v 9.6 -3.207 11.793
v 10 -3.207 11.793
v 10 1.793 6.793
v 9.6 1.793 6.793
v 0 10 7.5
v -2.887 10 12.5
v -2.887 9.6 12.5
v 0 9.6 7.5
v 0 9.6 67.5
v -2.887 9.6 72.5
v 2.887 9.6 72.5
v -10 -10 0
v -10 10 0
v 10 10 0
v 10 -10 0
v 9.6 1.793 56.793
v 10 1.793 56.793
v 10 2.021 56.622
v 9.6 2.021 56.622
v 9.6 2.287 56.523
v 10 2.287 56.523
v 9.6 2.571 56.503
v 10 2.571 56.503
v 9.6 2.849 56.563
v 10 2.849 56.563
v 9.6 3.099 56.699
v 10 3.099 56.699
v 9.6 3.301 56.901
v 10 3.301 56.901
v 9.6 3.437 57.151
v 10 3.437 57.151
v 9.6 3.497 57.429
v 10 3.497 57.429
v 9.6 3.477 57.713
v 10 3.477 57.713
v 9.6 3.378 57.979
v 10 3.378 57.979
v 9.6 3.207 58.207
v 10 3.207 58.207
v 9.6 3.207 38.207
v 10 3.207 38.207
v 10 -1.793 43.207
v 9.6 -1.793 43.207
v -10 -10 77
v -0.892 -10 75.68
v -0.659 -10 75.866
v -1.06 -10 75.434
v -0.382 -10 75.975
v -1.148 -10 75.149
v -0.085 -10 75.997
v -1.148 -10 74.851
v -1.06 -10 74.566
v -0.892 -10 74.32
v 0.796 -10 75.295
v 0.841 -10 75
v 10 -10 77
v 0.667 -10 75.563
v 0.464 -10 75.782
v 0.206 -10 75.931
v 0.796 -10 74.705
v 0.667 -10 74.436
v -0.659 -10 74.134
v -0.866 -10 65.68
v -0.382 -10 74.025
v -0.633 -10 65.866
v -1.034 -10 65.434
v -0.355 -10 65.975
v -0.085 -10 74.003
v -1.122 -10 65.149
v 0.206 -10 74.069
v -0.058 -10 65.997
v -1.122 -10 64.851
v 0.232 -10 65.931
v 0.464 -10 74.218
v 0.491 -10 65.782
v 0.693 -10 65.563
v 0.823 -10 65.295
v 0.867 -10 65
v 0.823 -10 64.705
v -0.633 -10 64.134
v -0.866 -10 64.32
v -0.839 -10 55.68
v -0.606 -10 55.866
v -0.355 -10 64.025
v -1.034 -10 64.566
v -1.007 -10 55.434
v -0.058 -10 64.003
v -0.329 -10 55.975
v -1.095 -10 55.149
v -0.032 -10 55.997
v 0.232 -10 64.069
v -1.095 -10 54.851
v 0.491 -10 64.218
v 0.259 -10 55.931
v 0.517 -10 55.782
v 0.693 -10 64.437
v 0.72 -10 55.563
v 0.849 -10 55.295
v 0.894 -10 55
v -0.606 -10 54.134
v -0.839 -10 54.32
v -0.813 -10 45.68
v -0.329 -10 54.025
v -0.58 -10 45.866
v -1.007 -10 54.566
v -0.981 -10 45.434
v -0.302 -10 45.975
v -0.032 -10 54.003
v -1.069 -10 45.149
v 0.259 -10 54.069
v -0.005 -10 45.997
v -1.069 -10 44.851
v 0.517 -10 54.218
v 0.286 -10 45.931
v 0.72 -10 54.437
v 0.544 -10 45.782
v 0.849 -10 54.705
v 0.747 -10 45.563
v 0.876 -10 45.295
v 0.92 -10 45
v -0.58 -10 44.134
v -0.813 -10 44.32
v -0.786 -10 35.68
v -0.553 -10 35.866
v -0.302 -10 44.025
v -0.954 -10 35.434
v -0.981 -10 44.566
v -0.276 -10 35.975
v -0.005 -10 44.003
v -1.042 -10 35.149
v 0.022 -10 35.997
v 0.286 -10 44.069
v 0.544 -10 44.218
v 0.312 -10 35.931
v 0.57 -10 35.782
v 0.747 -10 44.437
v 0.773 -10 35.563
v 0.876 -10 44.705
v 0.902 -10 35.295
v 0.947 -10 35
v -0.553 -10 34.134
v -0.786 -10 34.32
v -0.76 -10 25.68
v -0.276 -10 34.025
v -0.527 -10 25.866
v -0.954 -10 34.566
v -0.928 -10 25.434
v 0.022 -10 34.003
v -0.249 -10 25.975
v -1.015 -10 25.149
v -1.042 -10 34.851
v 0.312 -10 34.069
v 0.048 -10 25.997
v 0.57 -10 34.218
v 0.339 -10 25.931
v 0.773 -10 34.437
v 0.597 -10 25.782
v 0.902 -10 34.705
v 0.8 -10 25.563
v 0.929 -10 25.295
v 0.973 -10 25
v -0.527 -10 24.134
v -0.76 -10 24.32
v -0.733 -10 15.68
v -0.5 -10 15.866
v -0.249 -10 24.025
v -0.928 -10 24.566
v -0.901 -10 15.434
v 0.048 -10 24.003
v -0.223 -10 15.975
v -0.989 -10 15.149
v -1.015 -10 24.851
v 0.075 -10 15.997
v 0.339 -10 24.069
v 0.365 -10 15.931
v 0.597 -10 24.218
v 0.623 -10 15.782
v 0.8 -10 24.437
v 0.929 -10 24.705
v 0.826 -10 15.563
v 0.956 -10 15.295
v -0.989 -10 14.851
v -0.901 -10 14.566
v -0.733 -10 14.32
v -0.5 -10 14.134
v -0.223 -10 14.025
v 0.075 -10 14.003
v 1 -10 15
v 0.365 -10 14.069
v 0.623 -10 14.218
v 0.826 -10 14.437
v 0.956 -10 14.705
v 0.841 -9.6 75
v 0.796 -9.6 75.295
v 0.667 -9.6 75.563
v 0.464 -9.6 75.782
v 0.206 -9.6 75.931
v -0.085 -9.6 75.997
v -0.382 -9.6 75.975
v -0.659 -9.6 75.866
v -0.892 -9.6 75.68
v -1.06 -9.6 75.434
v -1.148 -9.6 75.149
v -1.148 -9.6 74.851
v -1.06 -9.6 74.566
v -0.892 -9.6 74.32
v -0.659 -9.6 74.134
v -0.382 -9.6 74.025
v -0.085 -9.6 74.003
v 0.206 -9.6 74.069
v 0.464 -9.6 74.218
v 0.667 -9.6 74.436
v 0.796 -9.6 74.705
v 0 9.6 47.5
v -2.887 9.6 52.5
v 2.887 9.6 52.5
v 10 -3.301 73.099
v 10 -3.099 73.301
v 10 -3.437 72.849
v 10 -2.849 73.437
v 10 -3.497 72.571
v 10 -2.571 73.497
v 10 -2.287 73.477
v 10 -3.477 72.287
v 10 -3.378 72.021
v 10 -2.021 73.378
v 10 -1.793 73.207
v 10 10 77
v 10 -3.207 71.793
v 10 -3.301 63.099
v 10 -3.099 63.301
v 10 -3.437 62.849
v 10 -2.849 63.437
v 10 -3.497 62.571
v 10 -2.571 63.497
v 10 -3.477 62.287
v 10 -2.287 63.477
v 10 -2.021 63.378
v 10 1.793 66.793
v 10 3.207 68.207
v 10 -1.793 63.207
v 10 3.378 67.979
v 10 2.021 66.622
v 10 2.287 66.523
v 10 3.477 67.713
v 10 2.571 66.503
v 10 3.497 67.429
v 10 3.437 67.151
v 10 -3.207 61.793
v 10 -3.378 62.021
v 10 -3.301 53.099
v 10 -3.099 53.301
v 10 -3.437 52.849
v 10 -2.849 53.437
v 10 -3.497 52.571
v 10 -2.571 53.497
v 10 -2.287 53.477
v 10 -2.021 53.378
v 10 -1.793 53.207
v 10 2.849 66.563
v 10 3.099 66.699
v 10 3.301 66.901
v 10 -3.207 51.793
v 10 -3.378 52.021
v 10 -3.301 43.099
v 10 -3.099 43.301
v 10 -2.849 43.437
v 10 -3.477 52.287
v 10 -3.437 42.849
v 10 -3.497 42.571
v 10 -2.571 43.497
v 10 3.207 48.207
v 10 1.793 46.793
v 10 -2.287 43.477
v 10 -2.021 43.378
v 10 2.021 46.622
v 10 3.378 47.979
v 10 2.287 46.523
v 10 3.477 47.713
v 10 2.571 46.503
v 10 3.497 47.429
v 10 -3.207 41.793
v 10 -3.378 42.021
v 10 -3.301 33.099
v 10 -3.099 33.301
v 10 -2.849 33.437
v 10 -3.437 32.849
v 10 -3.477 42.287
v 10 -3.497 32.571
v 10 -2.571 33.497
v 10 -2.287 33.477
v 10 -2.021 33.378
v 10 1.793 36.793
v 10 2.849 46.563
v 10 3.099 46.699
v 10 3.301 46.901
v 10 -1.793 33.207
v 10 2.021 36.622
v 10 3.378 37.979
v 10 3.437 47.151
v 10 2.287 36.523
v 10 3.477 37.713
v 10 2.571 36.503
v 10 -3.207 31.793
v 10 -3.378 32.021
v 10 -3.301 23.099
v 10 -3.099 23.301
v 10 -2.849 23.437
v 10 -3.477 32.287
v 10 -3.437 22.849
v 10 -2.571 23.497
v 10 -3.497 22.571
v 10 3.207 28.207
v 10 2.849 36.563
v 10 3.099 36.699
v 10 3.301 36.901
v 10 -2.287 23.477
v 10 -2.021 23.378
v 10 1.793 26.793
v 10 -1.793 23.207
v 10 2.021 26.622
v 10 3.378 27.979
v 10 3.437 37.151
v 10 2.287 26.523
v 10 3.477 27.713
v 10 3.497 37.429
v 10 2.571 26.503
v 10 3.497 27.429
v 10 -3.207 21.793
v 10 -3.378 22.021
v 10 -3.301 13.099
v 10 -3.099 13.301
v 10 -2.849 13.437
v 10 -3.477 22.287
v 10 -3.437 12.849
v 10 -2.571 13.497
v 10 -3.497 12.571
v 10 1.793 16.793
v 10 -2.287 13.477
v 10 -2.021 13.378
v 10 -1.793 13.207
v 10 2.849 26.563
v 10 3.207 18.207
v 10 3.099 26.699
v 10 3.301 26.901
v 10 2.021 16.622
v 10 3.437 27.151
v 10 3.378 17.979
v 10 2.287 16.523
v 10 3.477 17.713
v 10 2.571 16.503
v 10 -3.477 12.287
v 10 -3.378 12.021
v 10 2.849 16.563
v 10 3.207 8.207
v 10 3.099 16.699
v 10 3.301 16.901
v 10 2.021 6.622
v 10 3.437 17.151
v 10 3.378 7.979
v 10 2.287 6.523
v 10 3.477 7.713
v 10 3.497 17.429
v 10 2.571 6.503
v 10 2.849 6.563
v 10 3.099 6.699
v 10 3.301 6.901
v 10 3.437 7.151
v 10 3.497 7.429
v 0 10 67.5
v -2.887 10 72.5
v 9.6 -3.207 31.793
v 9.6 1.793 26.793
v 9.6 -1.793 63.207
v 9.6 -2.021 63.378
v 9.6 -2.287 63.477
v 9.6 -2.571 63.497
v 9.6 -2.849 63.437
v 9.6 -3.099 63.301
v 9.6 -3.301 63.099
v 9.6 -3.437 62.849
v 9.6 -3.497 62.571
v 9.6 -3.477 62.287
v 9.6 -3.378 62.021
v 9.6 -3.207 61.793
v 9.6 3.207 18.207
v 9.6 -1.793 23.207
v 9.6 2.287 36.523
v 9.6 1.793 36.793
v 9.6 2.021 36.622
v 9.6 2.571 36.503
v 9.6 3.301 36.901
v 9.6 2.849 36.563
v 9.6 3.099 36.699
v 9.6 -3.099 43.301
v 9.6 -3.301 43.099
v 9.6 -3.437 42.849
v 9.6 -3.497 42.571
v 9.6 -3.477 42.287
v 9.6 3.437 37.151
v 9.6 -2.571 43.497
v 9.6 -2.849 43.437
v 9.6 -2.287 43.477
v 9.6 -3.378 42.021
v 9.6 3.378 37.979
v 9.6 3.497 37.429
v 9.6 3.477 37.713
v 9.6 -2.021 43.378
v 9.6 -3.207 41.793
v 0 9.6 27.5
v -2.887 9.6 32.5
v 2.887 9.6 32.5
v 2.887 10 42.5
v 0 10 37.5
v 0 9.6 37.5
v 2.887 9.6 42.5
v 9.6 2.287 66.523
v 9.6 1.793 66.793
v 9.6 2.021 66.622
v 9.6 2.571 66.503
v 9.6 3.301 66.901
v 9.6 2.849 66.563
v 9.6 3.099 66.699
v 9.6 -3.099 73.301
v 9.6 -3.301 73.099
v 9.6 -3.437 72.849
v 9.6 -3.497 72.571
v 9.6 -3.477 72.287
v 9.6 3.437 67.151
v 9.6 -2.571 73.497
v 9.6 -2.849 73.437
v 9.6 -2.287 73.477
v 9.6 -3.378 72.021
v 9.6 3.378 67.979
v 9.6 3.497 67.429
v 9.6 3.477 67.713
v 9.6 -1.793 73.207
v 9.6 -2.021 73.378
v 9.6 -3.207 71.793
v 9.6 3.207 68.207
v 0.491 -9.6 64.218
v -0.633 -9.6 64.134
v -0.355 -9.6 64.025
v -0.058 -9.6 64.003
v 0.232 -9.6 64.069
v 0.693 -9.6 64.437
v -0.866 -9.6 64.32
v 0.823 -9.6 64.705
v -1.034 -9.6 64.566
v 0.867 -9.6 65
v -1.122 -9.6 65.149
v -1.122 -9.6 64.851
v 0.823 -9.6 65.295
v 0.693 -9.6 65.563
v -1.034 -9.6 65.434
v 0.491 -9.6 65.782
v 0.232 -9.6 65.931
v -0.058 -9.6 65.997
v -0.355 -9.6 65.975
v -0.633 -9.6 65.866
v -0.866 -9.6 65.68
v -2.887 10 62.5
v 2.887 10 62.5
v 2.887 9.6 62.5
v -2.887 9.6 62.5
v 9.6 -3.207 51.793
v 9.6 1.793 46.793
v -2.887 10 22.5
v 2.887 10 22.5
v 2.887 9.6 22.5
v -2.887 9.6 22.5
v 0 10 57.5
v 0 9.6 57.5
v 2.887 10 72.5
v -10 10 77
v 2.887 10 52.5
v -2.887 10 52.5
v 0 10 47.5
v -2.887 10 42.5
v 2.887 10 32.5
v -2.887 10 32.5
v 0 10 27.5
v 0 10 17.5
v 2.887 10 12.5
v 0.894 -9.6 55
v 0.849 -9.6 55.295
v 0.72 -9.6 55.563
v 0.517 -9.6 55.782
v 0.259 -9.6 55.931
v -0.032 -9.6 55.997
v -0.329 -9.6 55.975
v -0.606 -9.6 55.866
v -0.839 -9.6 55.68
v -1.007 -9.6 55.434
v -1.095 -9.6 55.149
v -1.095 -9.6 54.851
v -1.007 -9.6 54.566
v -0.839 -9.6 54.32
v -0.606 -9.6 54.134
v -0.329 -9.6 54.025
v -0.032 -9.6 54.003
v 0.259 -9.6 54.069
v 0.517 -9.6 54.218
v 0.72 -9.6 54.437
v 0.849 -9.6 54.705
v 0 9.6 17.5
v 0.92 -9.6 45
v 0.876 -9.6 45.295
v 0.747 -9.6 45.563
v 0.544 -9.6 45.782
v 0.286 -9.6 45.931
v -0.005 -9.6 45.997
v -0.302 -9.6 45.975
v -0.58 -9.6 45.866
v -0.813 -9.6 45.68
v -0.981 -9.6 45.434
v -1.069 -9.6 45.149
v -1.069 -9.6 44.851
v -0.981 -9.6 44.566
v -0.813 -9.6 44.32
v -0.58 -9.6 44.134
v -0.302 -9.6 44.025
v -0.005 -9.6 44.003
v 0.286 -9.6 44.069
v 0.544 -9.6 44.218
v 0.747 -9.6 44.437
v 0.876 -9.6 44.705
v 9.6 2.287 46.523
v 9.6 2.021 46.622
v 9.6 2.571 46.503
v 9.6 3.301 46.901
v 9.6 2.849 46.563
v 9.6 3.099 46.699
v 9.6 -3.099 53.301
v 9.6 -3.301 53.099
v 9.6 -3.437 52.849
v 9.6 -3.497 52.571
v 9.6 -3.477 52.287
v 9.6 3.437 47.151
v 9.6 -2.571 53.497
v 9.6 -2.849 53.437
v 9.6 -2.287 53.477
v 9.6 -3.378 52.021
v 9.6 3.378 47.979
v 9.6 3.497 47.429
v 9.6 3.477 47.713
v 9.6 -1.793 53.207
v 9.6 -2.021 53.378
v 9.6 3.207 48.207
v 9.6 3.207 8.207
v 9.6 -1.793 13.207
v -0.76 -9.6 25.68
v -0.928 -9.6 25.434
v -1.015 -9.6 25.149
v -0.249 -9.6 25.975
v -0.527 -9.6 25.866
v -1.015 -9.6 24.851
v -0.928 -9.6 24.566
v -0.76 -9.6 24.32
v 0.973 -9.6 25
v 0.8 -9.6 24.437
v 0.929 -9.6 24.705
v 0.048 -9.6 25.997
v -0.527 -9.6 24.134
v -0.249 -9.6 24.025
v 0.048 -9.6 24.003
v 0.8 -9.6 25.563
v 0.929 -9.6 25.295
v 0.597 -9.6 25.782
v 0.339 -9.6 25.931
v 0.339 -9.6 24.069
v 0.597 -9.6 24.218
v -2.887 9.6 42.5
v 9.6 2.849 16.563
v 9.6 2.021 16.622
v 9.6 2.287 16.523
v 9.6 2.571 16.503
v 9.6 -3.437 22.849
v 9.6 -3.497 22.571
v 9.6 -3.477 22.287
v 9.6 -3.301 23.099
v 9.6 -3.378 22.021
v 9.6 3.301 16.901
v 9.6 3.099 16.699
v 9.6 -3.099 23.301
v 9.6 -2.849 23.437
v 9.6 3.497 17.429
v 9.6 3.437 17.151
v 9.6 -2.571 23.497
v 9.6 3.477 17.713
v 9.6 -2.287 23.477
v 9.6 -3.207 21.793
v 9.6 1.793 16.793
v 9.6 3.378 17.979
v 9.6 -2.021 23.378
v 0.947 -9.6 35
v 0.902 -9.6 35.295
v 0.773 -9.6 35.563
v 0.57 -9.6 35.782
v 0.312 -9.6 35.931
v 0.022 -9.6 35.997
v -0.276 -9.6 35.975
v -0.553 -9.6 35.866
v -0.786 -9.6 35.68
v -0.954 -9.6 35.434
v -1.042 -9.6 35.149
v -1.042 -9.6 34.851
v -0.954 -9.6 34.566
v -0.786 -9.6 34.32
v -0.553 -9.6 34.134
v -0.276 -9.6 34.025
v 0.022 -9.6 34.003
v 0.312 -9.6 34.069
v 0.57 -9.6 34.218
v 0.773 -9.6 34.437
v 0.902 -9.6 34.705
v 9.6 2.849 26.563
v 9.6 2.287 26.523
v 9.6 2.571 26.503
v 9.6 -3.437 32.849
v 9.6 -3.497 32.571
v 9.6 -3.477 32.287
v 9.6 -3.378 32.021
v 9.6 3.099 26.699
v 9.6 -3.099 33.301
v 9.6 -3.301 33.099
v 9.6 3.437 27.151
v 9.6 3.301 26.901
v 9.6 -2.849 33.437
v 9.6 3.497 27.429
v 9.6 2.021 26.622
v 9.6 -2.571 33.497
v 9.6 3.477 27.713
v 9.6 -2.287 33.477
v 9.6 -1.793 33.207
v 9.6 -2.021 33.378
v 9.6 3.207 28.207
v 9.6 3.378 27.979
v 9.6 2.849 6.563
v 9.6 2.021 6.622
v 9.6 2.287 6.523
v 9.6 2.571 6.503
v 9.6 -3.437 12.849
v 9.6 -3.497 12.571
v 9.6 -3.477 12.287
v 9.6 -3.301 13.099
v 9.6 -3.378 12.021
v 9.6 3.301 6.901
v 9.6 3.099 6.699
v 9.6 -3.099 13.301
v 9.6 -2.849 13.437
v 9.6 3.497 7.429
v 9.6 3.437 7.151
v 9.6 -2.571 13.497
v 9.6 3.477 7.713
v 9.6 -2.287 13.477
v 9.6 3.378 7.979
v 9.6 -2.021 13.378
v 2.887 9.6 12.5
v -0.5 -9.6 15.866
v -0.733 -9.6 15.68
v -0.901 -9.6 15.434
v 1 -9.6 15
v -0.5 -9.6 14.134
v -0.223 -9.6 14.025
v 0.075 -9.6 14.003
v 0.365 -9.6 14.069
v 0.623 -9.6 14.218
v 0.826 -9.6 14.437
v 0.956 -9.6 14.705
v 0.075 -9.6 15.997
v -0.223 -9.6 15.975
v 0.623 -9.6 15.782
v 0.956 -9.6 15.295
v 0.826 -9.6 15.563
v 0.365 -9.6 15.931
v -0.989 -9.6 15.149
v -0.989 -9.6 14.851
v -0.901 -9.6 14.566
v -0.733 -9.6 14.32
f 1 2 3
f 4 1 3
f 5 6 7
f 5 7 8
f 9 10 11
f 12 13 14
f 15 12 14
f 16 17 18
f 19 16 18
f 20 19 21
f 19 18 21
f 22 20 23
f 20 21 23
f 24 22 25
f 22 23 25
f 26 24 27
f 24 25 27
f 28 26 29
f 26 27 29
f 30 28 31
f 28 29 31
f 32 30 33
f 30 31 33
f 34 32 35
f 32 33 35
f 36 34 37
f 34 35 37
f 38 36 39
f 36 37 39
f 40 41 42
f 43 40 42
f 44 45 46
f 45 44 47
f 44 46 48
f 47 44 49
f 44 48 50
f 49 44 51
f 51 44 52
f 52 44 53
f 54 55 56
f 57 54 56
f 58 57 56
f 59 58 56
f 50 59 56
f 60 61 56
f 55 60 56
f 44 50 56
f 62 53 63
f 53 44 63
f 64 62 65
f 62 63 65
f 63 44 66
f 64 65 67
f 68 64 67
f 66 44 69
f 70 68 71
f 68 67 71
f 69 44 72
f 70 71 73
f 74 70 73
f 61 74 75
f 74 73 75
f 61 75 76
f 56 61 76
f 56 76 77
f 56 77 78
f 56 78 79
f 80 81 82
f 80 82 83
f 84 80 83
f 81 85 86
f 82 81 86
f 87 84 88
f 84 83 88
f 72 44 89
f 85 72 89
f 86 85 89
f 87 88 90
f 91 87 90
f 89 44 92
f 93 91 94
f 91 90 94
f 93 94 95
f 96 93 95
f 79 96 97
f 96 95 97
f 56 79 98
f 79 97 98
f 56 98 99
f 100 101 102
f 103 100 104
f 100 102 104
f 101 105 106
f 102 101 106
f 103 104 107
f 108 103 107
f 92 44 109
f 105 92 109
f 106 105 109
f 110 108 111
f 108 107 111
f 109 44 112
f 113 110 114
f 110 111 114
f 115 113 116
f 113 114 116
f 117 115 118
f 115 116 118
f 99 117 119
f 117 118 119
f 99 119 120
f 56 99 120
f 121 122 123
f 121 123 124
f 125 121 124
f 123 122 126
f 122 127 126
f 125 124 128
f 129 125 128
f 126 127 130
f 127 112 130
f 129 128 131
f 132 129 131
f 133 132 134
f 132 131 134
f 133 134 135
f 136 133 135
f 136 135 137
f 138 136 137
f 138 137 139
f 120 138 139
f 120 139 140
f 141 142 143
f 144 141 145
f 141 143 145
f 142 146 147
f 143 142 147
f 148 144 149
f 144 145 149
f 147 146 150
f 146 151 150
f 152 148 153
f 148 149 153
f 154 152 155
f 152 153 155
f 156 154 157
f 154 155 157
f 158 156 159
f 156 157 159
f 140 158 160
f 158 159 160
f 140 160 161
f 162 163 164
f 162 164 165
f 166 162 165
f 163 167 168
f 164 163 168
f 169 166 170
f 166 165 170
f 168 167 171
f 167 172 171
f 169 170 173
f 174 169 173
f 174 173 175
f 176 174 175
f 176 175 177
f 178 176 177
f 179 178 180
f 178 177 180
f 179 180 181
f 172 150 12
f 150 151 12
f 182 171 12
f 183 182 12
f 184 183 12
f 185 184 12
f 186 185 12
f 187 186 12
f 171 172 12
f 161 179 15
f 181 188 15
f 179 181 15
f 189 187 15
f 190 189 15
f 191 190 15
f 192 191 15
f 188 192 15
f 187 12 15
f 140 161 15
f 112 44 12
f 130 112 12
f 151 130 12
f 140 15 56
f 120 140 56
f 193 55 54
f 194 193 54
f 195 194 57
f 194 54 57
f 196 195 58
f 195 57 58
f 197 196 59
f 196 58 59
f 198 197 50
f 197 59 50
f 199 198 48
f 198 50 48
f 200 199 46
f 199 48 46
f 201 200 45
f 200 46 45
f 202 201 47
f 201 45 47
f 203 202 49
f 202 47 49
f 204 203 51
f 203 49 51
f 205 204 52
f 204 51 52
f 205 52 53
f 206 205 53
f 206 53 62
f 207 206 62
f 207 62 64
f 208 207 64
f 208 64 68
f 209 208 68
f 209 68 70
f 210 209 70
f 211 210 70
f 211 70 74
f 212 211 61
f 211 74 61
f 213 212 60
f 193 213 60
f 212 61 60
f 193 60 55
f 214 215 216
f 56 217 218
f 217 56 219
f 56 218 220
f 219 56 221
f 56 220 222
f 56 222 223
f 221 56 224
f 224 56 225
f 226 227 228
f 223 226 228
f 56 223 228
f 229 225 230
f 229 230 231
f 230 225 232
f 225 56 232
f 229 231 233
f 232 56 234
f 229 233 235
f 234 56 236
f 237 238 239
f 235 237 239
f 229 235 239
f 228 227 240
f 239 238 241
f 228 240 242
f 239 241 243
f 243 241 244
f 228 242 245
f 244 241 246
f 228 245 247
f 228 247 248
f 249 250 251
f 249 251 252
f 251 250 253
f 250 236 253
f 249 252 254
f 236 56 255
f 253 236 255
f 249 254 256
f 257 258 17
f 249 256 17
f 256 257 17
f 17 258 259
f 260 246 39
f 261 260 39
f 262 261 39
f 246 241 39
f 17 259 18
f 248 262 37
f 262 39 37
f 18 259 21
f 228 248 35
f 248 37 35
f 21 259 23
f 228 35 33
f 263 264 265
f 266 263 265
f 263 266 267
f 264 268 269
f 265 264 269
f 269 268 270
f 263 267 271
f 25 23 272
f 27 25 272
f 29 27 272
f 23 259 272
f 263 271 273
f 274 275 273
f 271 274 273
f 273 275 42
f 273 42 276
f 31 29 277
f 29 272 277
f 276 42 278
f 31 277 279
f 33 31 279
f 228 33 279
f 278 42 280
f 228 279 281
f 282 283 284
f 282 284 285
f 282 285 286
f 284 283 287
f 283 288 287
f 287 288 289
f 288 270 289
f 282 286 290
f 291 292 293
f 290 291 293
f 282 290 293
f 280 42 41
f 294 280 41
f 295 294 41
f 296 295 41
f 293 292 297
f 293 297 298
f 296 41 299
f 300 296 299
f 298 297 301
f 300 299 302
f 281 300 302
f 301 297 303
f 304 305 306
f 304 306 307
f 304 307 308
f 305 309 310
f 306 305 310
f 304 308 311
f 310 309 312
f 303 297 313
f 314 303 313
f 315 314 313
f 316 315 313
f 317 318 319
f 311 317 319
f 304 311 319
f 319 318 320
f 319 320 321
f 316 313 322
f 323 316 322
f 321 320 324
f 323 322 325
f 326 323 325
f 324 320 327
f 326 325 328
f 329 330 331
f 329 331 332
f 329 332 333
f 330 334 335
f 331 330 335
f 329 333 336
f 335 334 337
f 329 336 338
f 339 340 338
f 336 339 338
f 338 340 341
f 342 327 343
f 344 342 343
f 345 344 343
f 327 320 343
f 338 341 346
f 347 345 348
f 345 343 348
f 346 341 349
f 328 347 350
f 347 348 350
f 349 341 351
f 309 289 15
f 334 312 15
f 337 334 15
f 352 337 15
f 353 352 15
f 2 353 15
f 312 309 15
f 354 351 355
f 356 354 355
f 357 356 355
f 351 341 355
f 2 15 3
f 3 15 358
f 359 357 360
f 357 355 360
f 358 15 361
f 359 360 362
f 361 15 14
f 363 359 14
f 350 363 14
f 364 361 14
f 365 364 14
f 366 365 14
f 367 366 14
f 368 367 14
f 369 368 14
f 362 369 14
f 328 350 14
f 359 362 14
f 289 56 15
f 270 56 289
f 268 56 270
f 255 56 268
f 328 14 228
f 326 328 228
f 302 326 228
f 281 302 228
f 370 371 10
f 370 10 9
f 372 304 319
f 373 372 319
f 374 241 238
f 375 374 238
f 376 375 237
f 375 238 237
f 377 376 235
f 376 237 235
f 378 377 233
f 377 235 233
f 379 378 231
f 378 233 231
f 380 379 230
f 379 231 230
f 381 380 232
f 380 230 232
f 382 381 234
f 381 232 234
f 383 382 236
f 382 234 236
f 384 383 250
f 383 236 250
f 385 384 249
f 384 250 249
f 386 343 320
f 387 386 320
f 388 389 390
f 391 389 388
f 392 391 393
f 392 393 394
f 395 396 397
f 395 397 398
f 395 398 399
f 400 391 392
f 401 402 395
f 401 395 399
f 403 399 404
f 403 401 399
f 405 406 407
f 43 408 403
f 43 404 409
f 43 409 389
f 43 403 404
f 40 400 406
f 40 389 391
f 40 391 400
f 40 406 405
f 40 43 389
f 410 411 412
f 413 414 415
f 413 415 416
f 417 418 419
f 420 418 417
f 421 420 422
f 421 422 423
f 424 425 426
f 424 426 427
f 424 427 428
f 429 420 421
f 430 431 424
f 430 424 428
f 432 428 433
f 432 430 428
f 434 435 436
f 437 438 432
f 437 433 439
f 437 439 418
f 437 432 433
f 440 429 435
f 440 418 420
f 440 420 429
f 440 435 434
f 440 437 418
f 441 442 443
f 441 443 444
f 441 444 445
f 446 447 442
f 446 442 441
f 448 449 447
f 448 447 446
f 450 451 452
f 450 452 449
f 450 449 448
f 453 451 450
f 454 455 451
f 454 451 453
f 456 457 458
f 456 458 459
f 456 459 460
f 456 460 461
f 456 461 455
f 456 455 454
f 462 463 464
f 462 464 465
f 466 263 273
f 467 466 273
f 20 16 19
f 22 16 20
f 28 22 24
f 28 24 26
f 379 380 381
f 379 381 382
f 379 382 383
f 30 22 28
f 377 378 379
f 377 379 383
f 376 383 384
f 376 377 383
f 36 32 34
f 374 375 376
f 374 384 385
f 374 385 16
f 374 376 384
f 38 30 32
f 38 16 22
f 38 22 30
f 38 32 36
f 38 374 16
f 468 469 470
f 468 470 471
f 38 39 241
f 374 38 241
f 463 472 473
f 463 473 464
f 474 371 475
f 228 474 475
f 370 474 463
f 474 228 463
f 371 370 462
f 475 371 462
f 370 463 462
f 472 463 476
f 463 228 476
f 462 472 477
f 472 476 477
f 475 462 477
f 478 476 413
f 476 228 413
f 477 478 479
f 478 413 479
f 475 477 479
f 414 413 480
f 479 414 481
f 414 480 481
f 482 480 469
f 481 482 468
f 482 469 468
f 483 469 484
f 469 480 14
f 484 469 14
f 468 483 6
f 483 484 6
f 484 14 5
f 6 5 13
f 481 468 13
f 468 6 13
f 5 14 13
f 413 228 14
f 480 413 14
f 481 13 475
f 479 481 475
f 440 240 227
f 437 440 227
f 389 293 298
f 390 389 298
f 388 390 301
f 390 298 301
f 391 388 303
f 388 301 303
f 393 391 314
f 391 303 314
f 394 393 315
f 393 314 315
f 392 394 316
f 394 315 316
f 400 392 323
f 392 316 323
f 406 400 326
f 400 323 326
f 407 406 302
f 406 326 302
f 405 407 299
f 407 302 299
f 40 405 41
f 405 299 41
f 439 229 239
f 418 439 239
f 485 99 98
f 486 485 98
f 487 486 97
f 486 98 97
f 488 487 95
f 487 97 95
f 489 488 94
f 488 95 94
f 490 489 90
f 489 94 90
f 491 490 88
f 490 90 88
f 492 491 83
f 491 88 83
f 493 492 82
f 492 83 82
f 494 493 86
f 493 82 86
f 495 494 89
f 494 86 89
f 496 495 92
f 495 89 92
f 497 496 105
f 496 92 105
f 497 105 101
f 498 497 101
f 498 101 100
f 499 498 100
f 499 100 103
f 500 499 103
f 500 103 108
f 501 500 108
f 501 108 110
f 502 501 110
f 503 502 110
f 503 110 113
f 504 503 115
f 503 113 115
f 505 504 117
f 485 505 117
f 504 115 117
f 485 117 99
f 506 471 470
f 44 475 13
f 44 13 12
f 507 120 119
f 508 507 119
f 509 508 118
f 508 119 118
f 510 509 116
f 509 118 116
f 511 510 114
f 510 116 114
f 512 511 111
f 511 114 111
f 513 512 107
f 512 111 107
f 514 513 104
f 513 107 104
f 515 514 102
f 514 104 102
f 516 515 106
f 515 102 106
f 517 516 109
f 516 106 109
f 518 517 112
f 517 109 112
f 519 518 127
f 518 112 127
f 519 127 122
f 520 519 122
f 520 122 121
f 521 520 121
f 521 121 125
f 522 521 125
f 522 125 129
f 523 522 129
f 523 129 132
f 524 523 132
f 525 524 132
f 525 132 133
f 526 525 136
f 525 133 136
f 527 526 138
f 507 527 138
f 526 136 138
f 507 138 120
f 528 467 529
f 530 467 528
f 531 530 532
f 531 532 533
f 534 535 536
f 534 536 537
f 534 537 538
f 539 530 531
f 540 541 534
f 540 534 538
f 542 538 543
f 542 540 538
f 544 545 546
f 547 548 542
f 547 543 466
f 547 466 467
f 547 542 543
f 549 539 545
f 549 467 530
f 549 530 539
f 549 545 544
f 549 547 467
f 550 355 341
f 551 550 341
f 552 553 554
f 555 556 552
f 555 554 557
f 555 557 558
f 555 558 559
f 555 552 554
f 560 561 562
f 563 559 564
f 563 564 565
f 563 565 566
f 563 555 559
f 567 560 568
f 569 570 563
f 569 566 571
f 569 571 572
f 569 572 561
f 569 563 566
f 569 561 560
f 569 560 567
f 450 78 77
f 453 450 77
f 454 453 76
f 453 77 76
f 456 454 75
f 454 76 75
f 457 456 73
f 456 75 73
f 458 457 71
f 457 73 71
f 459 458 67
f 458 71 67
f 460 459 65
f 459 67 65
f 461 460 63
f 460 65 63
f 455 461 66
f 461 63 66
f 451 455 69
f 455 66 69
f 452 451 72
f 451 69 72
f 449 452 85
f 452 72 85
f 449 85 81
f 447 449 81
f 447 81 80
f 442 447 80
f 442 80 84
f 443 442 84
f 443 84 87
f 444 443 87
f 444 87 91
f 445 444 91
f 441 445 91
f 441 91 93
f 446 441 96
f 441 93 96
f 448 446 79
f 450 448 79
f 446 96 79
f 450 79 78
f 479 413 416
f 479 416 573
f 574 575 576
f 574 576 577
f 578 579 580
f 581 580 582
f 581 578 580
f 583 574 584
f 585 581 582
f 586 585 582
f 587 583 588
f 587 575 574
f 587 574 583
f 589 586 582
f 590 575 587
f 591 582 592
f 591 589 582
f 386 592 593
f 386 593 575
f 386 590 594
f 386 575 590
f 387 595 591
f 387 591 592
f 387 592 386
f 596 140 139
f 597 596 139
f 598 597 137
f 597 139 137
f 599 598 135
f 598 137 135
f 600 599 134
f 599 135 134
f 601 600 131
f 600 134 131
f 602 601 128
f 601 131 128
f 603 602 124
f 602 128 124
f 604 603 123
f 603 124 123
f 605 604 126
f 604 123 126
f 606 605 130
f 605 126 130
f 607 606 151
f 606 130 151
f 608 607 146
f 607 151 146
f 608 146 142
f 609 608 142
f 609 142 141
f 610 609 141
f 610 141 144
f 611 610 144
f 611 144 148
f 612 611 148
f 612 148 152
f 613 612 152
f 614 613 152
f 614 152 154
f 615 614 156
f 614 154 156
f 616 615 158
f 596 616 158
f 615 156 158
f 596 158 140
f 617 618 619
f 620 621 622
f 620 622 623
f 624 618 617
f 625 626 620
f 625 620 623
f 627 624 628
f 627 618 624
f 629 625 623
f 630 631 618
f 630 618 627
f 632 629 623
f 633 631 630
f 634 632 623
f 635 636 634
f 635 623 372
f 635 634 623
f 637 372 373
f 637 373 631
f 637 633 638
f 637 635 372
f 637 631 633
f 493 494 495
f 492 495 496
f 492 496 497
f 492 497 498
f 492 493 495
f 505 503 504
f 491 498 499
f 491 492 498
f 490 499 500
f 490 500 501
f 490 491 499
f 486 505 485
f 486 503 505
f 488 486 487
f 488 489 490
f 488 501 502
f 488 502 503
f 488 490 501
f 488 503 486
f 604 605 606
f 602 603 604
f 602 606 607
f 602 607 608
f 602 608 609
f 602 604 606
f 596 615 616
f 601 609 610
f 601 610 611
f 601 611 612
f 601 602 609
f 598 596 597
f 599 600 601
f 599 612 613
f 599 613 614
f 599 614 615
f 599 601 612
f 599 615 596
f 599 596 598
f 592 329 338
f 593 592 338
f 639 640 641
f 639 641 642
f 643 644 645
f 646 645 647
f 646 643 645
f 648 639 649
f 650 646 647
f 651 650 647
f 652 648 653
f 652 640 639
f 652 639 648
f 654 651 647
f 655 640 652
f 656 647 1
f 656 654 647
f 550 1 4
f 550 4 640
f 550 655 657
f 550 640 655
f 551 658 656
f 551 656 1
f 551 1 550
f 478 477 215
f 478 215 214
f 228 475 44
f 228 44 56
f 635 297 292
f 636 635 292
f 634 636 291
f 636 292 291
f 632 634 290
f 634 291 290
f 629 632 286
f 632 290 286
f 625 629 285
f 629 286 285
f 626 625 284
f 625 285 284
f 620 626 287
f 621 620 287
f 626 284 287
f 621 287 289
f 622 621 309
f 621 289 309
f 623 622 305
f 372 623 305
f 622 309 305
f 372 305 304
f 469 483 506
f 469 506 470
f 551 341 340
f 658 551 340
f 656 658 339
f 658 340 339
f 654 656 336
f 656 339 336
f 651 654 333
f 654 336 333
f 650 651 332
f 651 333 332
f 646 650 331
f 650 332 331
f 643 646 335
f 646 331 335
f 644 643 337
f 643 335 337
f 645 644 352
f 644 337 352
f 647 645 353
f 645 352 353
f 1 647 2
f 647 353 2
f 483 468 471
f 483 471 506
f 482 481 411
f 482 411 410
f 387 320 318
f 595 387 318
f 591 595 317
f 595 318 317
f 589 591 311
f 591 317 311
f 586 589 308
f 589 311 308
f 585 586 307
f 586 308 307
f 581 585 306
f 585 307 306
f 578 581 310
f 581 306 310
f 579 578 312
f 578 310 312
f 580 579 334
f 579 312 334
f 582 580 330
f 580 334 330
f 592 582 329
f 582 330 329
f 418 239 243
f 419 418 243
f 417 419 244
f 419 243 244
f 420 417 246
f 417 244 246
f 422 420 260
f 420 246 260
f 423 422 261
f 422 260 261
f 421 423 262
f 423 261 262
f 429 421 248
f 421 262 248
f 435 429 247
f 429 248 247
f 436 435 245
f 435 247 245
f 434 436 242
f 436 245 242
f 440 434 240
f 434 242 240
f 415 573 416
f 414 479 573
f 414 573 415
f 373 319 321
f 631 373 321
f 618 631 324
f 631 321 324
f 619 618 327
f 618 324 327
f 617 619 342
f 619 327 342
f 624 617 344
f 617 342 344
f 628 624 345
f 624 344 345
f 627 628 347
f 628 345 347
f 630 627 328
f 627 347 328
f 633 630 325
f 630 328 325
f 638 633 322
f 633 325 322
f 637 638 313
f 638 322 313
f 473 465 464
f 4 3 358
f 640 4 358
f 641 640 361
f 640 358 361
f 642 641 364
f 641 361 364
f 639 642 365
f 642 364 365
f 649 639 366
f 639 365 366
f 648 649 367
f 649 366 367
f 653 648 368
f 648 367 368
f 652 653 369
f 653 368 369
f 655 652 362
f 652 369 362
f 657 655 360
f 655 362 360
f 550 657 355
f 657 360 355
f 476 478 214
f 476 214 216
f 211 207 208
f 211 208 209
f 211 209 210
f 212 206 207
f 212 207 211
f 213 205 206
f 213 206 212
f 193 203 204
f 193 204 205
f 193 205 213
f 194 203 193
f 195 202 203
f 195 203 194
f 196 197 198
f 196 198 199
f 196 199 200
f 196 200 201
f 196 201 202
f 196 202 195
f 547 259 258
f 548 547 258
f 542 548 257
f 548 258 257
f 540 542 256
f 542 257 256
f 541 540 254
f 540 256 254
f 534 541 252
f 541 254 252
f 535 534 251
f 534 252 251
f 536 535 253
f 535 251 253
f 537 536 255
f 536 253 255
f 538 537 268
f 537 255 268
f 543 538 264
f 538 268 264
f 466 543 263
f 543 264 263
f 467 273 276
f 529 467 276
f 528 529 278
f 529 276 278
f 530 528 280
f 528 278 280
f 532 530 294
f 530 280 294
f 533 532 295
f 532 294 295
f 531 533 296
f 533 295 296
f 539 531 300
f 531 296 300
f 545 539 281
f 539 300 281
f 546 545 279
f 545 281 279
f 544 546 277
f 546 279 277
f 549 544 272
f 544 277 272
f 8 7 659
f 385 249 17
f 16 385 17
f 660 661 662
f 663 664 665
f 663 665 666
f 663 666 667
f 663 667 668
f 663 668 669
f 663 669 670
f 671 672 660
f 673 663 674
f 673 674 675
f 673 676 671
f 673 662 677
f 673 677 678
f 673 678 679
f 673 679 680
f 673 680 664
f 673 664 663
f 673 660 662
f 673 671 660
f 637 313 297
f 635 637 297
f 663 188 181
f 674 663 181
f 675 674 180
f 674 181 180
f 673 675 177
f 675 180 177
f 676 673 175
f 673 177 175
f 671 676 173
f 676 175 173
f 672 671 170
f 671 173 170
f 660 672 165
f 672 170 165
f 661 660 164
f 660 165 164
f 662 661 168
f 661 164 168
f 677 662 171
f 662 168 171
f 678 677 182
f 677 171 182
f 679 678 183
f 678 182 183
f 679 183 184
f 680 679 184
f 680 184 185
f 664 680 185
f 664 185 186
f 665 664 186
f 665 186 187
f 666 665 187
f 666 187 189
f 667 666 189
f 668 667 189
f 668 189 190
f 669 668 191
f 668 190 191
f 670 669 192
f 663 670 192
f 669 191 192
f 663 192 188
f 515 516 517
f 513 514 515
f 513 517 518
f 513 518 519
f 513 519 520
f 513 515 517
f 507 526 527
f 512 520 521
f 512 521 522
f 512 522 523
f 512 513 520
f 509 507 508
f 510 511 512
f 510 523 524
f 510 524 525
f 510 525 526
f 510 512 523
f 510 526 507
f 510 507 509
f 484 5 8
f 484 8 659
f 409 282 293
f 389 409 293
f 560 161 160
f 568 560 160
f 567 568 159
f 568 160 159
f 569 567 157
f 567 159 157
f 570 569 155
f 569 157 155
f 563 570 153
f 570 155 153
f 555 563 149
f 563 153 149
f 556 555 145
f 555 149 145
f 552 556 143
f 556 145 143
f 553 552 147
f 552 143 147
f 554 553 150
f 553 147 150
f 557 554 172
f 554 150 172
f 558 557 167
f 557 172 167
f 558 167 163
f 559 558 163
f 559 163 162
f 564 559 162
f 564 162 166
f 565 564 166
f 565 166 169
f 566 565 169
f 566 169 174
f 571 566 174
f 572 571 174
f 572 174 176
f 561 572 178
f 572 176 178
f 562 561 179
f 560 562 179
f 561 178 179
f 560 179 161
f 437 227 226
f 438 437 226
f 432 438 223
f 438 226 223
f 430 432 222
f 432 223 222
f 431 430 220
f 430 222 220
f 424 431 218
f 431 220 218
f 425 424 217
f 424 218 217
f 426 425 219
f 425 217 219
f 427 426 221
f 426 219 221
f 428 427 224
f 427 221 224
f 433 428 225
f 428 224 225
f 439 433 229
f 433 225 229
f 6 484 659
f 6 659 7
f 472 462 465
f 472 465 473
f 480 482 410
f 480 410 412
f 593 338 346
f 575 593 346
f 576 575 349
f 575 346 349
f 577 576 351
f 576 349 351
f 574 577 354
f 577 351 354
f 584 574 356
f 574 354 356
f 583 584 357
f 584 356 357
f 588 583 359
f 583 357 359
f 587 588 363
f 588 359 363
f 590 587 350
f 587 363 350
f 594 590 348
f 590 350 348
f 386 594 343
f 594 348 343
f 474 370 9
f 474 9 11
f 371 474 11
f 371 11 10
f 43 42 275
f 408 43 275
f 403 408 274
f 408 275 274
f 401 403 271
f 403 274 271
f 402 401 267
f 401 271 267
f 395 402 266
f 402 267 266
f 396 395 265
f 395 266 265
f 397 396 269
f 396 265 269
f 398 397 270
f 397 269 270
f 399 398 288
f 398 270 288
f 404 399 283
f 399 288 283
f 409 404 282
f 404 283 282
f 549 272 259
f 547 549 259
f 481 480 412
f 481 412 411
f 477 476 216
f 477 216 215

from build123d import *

# Parameters (mm, degrees)
F1_DEPTH  = 77
F3_R      = 1
F4_DEPTH  = 0.4
F1_FACE_W = 20
F1_FACE_H = 77
F7_DEPTH  = 0.4
F10_DEPTH = 0.4


with BuildPart() as f1:
    # F0 (on Top) → F1 (new body)
    with BuildSketch(Plane.XY):
        with BuildLine():
            ThreePointArc((-10, 0), (-7.0710678119, 7.0710678119), (0, 10))
            Line((0, 10), (-10, 10))
            Line((-10, 10), (-10, 0))
        make_face()
        with BuildLine():
            Line((-10, -10), (0, -10))
            ThreePointArc((0, -10), (-7.0710678119, -7.0710678119), (-10, 0))
            Line((-10, 0), (-10, -10))
        make_face()
        with BuildLine():
            Line((10, -10), (10, 0))
            ThreePointArc((10, 0), (7.0710678119, -7.0710678119), (0, -10))
            Line((0, -10), (10, -10))
        make_face()
        with BuildLine():
            ThreePointArc((0, 10), (7.0710678119, 7.0710678119), (10, 0))
            Line((10, 0), (10, 10))
            Line((10, 10), (0, 10))
        make_face()
        with BuildLine():
            ThreePointArc((0, -10), (7.0710678119, -7.0710678119), (10, 0))
            ThreePointArc((10, 0), (7.0710678119, 7.0710678119), (0, 10))
            ThreePointArc((0, 10), (-7.0710678119, 7.0710678119), (-10, 0))
            ThreePointArc((-10, 0), (-7.0710678119, -7.0710678119), (0, -10))
        make_face()
    extrude(amount=F1_DEPTH)

    # F3 (on offset) → F4 (cut)
    with BuildSketch(Plane.XZ.offset(10)):
        with Locations((0, 15)):
            Circle(F3_R)
        with Locations((-0.0265743064, 24.9999646902)):
            Circle(F3_R)
        with Locations((-0.0531486127, 34.9999293805)):
            Circle(F3_R)
        with Locations((-0.0797229191, 44.9998940707)):
            Circle(F3_R)
        with Locations((-0.1062972255, 54.999858761)):
            Circle(F3_R)
        with Locations((-0.1328715318, 64.9998234512)):
            Circle(F3_R)
        with Locations((-0.1594458382, 74.9997881415)):
            Circle(F3_R)
    extrude(amount=-F4_DEPTH, mode=Mode.SUBTRACT)

    # F6 (on offset) + F1_face (on face) → F7 (cut)
    with BuildSketch(Plane.YZ.offset(10)):
        with BuildLine():
            ThreePointArc((-1.7928932188, 13.2071067812), (-3.2071067812, 13.2071067812), (-3.2071067812, 11.7928932188))
            Line((-3.2071067812, 11.7928932188), (1.7928932188, 6.7928932188))
            ThreePointArc((1.7928932188, 6.7928932188), (3.2071067812, 6.7928932188), (3.2071067812, 8.2071067812))
            Line((3.2071067812, 8.2071067812), (-1.7928932188, 13.2071067812))
        make_face()
        with BuildLine():
            ThreePointArc((-1.7928932188, 23.2071067812), (-3.2071067812, 23.2071067812), (-3.2071067812, 21.7928932188))
            Line((-3.2071067812, 21.7928932188), (1.7928932188, 16.7928932188))
            ThreePointArc((1.7928932188, 16.7928932188), (3.2071067812, 16.7928932188), (3.2071067812, 18.2071067812))
            Line((3.2071067812, 18.2071067812), (-1.7928932188, 23.2071067812))
        make_face()
        with BuildLine():
            ThreePointArc((-1.7928932188, 33.2071067812), (-3.2071067812, 33.2071067812), (-3.2071067812, 31.7928932188))
            Line((-3.2071067812, 31.7928932188), (1.7928932188, 26.7928932188))
            ThreePointArc((1.7928932188, 26.7928932188), (3.2071067812, 26.7928932188), (3.2071067812, 28.2071067812))
            Line((3.2071067812, 28.2071067812), (-1.7928932188, 33.2071067812))
        make_face()
        with BuildLine():
            ThreePointArc((-1.7928932188, 43.2071067812), (-3.2071067812, 43.2071067812), (-3.2071067812, 41.7928932188))
            Line((-3.2071067812, 41.7928932188), (1.7928932188, 36.7928932188))
            ThreePointArc((1.7928932188, 36.7928932188), (3.2071067812, 36.7928932188), (3.2071067812, 38.2071067812))
            Line((3.2071067812, 38.2071067812), (-1.7928932188, 43.2071067812))
        make_face()
        with BuildLine():
            ThreePointArc((-1.7928932188, 53.2071067812), (-3.2071067812, 53.2071067812), (-3.2071067812, 51.7928932188))
            Line((-3.2071067812, 51.7928932188), (1.7928932188, 46.7928932188))
            ThreePointArc((1.7928932188, 46.7928932188), (3.2071067812, 46.7928932188), (3.2071067812, 48.2071067812))
            Line((3.2071067812, 48.2071067812), (-1.7928932188, 53.2071067812))
        make_face()
        with BuildLine():
            ThreePointArc((-1.7928932188, 63.2071067812), (-3.2071067812, 63.2071067812), (-3.2071067812, 61.7928932188))
            Line((-3.2071067812, 61.7928932188), (1.7928932188, 56.7928932188))
            ThreePointArc((1.7928932188, 56.7928932188), (3.2071067812, 56.7928932188), (3.2071067812, 58.2071067812))
            Line((3.2071067812, 58.2071067812), (-1.7928932188, 63.2071067812))
        make_face()
        with BuildLine():
            ThreePointArc((-1.7928932188, 73.2071067812), (-3.2071067812, 73.2071067812), (-3.2071067812, 71.7928932188))
            Line((-3.2071067812, 71.7928932188), (1.7928932188, 66.7928932188))
            ThreePointArc((1.7928932188, 66.7928932188), (3.2071067812, 66.7928932188), (3.2071067812, 68.2071067812))
            Line((3.2071067812, 68.2071067812), (-1.7928932188, 73.2071067812))
        make_face()
    with BuildSketch(Plane(origin=(-10, 0, 38.5), x_dir=(0, -1, 0), z_dir=(-1, 0, 0))):
        Rectangle(F1_FACE_W, F1_FACE_H)
    extrude(amount=-F7_DEPTH, dir=(1, 0, 0), mode=Mode.SUBTRACT)

    # F9 (on offset) → F10 (cut)
    with BuildSketch(Plane.XZ.offset(-10)):
        Polygon((2.8867513459, 12.5), (-2.8867513459, 12.5), (0, 7.5), align=None)
        Polygon((-2.8867513459, 22.5), (0, 17.5), (2.8867513459, 22.5), align=None)
        Polygon((-2.8867513459, 32.5), (0, 27.5), (2.8867513459, 32.5), align=None)
        Polygon((-2.8867513459, 42.5), (0, 37.5), (2.8867513459, 42.5), align=None)
        Polygon((-2.8867513459, 52.5), (0, 47.5), (2.8867513459, 52.5), align=None)
        Polygon((-2.8867513459, 62.5), (0, 57.5), (2.8867513459, 62.5), align=None)
        Polygon((-2.8867513459, 72.5), (0, 67.5), (2.8867513459, 72.5), align=None)
    extrude(amount=F10_DEPTH, mode=Mode.SUBTRACT)


solid = f1.part
